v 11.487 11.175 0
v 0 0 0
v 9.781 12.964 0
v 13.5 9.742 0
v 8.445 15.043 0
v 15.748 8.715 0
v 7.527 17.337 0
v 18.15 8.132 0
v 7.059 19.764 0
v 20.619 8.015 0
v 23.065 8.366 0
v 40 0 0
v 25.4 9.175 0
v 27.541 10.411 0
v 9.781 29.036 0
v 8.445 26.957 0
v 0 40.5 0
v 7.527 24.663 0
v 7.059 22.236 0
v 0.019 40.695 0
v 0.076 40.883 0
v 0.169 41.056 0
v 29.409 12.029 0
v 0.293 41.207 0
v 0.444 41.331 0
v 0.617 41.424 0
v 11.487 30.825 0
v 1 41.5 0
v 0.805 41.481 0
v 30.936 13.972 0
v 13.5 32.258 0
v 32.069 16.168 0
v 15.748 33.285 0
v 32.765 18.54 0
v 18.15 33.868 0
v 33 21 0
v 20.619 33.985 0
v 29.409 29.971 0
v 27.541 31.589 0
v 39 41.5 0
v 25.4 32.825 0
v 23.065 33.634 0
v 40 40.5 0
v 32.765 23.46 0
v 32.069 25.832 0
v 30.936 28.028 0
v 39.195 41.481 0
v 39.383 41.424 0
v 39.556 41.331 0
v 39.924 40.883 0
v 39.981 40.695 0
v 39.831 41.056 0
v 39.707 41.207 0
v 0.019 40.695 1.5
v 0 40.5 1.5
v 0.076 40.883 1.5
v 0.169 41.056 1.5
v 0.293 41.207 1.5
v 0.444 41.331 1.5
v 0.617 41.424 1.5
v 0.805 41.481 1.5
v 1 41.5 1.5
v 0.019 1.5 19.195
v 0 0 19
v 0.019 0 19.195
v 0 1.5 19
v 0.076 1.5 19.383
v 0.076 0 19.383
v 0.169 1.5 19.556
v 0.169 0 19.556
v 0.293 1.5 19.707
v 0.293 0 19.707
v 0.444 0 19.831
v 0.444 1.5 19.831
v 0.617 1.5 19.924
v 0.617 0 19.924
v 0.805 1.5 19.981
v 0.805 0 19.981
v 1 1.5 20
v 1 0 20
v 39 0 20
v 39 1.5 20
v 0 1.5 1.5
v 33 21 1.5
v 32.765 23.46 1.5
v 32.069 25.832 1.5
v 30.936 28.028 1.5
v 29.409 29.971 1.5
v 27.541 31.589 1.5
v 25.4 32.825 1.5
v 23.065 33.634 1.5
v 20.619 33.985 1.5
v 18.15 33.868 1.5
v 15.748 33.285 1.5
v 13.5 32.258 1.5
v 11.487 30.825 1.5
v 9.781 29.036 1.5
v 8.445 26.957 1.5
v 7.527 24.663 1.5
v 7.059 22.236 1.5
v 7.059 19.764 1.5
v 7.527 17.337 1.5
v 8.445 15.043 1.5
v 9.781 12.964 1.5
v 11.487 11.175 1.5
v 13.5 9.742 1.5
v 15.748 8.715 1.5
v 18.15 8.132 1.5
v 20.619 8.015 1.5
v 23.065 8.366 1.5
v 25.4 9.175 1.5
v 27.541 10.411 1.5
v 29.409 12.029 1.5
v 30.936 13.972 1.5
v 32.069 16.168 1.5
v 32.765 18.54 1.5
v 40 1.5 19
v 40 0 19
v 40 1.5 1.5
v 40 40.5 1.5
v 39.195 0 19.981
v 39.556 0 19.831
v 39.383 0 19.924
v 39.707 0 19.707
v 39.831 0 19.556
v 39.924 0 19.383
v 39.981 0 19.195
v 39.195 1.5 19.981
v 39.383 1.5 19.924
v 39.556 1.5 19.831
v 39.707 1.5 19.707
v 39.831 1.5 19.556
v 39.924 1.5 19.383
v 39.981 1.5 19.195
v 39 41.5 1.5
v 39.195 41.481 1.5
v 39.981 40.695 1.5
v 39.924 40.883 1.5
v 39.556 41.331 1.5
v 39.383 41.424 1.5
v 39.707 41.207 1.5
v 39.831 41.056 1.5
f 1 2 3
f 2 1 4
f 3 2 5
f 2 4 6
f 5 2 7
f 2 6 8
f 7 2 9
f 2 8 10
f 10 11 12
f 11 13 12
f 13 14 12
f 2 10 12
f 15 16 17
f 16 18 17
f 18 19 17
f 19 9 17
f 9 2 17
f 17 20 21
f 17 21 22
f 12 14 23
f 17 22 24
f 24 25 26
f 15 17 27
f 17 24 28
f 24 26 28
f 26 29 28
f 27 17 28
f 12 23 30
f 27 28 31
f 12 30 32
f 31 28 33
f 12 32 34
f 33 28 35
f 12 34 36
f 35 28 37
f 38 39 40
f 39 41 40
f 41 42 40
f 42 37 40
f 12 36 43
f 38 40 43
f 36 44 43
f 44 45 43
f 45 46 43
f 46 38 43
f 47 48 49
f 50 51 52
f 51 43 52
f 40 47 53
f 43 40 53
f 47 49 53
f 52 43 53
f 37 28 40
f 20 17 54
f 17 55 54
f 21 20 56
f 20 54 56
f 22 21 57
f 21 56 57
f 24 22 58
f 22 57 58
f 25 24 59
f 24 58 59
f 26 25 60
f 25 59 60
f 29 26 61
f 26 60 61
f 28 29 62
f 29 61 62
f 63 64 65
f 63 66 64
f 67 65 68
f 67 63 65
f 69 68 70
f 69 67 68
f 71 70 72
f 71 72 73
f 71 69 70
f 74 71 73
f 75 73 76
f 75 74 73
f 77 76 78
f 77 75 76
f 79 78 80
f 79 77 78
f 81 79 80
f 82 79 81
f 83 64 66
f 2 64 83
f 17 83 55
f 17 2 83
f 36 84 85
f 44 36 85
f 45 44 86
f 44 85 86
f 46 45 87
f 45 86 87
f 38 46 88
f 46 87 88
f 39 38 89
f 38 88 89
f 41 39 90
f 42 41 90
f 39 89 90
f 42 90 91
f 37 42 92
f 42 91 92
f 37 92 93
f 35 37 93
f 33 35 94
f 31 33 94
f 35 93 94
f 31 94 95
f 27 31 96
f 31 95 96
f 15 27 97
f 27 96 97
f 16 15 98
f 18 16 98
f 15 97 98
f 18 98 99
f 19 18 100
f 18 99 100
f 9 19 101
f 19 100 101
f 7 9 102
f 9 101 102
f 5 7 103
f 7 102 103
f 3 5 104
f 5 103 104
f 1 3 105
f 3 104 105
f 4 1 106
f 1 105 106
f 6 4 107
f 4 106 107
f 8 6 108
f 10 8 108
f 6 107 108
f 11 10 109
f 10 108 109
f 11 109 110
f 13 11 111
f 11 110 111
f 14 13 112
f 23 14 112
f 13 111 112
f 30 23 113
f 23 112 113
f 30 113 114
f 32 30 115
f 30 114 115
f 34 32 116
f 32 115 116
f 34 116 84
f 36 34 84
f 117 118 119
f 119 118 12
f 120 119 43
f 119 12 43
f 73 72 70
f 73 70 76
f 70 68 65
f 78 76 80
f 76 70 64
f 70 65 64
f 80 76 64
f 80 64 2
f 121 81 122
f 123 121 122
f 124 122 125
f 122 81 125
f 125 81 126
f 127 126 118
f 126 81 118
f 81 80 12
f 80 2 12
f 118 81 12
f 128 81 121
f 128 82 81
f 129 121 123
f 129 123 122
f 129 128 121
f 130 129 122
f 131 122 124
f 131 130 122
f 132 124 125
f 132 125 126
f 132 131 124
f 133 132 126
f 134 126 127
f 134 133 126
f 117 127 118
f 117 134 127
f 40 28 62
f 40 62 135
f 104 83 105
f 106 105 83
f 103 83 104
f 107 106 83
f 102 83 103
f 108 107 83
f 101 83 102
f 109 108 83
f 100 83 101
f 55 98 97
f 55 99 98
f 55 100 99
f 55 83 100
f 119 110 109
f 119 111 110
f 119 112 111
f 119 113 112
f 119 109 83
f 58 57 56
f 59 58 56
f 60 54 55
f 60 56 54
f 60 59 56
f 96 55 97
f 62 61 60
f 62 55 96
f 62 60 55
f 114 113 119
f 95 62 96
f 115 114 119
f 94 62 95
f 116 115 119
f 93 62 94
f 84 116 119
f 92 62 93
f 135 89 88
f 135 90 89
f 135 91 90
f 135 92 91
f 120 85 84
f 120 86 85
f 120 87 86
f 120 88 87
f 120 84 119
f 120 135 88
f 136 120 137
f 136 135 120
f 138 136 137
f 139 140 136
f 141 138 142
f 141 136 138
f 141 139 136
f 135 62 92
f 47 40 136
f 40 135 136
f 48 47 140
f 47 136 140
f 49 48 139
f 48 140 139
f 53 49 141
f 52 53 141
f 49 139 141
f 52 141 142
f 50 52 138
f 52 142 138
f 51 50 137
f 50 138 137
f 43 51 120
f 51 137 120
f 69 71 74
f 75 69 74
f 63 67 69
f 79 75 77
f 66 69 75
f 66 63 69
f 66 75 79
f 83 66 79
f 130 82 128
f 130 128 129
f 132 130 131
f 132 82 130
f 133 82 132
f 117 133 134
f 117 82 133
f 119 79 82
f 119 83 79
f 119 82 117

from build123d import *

# Parameters (mm, degrees)
SKETCH1_W           = 40
SKETCH1_H           = 41.5
BOSS_EXTRUDE1_DEPTH = 1.5
SKETCH2_W           = 40
SKETCH2_H           = 1.5
BOSS_EXTRUDE2_DEPTH = 18.5
FILLET1_R           = 1
FILLET2_R           = 1
SKETCH3_R           = 13
CUT_EXTRUDE1_DEPTH  = 1.5


with BuildPart() as part:
    # Sketch1 → Boss-Extrude1 (new body)
    with BuildSketch(Plane.XY):
        with Locations((20, 20.75)):
            Rectangle(SKETCH1_W, SKETCH1_H)
    extrude(amount=BOSS_EXTRUDE1_DEPTH)

    # Sketch2 → Boss-Extrude2 (add)
    with BuildSketch(Plane.XY.offset(1.5)):
        with Locations((20, 0.75)):
            Rectangle(SKETCH2_W, SKETCH2_H)
    extrude(amount=BOSS_EXTRUDE2_DEPTH)

    # Fillet1
    fillet1_edges = [part.edges().sort_by_distance(p)[0] for p in [
        (0, 41.5, 0.75),
    ]]
    fillet(fillet1_edges, radius=FILLET1_R)

    # Fillet2
    fillet2_edges = [part.edges().sort_by_distance(p)[0] for p in [
        (0, 0.75, 20),
        (40, 0.75, 20),
        (40, 41.5, 0.75),
    ]]
    fillet(fillet2_edges, radius=FILLET2_R)

    # Sketch3 → Cut-Extrude1 (cut)
    with BuildSketch(Plane.XY.offset(1.5)):
        with Locations((20, 21)):
            Circle(SKETCH3_R)
    extrude(amount=-CUT_EXTRUDE1_DEPTH, mode=Mode.SUBTRACT)


solid = part.part
